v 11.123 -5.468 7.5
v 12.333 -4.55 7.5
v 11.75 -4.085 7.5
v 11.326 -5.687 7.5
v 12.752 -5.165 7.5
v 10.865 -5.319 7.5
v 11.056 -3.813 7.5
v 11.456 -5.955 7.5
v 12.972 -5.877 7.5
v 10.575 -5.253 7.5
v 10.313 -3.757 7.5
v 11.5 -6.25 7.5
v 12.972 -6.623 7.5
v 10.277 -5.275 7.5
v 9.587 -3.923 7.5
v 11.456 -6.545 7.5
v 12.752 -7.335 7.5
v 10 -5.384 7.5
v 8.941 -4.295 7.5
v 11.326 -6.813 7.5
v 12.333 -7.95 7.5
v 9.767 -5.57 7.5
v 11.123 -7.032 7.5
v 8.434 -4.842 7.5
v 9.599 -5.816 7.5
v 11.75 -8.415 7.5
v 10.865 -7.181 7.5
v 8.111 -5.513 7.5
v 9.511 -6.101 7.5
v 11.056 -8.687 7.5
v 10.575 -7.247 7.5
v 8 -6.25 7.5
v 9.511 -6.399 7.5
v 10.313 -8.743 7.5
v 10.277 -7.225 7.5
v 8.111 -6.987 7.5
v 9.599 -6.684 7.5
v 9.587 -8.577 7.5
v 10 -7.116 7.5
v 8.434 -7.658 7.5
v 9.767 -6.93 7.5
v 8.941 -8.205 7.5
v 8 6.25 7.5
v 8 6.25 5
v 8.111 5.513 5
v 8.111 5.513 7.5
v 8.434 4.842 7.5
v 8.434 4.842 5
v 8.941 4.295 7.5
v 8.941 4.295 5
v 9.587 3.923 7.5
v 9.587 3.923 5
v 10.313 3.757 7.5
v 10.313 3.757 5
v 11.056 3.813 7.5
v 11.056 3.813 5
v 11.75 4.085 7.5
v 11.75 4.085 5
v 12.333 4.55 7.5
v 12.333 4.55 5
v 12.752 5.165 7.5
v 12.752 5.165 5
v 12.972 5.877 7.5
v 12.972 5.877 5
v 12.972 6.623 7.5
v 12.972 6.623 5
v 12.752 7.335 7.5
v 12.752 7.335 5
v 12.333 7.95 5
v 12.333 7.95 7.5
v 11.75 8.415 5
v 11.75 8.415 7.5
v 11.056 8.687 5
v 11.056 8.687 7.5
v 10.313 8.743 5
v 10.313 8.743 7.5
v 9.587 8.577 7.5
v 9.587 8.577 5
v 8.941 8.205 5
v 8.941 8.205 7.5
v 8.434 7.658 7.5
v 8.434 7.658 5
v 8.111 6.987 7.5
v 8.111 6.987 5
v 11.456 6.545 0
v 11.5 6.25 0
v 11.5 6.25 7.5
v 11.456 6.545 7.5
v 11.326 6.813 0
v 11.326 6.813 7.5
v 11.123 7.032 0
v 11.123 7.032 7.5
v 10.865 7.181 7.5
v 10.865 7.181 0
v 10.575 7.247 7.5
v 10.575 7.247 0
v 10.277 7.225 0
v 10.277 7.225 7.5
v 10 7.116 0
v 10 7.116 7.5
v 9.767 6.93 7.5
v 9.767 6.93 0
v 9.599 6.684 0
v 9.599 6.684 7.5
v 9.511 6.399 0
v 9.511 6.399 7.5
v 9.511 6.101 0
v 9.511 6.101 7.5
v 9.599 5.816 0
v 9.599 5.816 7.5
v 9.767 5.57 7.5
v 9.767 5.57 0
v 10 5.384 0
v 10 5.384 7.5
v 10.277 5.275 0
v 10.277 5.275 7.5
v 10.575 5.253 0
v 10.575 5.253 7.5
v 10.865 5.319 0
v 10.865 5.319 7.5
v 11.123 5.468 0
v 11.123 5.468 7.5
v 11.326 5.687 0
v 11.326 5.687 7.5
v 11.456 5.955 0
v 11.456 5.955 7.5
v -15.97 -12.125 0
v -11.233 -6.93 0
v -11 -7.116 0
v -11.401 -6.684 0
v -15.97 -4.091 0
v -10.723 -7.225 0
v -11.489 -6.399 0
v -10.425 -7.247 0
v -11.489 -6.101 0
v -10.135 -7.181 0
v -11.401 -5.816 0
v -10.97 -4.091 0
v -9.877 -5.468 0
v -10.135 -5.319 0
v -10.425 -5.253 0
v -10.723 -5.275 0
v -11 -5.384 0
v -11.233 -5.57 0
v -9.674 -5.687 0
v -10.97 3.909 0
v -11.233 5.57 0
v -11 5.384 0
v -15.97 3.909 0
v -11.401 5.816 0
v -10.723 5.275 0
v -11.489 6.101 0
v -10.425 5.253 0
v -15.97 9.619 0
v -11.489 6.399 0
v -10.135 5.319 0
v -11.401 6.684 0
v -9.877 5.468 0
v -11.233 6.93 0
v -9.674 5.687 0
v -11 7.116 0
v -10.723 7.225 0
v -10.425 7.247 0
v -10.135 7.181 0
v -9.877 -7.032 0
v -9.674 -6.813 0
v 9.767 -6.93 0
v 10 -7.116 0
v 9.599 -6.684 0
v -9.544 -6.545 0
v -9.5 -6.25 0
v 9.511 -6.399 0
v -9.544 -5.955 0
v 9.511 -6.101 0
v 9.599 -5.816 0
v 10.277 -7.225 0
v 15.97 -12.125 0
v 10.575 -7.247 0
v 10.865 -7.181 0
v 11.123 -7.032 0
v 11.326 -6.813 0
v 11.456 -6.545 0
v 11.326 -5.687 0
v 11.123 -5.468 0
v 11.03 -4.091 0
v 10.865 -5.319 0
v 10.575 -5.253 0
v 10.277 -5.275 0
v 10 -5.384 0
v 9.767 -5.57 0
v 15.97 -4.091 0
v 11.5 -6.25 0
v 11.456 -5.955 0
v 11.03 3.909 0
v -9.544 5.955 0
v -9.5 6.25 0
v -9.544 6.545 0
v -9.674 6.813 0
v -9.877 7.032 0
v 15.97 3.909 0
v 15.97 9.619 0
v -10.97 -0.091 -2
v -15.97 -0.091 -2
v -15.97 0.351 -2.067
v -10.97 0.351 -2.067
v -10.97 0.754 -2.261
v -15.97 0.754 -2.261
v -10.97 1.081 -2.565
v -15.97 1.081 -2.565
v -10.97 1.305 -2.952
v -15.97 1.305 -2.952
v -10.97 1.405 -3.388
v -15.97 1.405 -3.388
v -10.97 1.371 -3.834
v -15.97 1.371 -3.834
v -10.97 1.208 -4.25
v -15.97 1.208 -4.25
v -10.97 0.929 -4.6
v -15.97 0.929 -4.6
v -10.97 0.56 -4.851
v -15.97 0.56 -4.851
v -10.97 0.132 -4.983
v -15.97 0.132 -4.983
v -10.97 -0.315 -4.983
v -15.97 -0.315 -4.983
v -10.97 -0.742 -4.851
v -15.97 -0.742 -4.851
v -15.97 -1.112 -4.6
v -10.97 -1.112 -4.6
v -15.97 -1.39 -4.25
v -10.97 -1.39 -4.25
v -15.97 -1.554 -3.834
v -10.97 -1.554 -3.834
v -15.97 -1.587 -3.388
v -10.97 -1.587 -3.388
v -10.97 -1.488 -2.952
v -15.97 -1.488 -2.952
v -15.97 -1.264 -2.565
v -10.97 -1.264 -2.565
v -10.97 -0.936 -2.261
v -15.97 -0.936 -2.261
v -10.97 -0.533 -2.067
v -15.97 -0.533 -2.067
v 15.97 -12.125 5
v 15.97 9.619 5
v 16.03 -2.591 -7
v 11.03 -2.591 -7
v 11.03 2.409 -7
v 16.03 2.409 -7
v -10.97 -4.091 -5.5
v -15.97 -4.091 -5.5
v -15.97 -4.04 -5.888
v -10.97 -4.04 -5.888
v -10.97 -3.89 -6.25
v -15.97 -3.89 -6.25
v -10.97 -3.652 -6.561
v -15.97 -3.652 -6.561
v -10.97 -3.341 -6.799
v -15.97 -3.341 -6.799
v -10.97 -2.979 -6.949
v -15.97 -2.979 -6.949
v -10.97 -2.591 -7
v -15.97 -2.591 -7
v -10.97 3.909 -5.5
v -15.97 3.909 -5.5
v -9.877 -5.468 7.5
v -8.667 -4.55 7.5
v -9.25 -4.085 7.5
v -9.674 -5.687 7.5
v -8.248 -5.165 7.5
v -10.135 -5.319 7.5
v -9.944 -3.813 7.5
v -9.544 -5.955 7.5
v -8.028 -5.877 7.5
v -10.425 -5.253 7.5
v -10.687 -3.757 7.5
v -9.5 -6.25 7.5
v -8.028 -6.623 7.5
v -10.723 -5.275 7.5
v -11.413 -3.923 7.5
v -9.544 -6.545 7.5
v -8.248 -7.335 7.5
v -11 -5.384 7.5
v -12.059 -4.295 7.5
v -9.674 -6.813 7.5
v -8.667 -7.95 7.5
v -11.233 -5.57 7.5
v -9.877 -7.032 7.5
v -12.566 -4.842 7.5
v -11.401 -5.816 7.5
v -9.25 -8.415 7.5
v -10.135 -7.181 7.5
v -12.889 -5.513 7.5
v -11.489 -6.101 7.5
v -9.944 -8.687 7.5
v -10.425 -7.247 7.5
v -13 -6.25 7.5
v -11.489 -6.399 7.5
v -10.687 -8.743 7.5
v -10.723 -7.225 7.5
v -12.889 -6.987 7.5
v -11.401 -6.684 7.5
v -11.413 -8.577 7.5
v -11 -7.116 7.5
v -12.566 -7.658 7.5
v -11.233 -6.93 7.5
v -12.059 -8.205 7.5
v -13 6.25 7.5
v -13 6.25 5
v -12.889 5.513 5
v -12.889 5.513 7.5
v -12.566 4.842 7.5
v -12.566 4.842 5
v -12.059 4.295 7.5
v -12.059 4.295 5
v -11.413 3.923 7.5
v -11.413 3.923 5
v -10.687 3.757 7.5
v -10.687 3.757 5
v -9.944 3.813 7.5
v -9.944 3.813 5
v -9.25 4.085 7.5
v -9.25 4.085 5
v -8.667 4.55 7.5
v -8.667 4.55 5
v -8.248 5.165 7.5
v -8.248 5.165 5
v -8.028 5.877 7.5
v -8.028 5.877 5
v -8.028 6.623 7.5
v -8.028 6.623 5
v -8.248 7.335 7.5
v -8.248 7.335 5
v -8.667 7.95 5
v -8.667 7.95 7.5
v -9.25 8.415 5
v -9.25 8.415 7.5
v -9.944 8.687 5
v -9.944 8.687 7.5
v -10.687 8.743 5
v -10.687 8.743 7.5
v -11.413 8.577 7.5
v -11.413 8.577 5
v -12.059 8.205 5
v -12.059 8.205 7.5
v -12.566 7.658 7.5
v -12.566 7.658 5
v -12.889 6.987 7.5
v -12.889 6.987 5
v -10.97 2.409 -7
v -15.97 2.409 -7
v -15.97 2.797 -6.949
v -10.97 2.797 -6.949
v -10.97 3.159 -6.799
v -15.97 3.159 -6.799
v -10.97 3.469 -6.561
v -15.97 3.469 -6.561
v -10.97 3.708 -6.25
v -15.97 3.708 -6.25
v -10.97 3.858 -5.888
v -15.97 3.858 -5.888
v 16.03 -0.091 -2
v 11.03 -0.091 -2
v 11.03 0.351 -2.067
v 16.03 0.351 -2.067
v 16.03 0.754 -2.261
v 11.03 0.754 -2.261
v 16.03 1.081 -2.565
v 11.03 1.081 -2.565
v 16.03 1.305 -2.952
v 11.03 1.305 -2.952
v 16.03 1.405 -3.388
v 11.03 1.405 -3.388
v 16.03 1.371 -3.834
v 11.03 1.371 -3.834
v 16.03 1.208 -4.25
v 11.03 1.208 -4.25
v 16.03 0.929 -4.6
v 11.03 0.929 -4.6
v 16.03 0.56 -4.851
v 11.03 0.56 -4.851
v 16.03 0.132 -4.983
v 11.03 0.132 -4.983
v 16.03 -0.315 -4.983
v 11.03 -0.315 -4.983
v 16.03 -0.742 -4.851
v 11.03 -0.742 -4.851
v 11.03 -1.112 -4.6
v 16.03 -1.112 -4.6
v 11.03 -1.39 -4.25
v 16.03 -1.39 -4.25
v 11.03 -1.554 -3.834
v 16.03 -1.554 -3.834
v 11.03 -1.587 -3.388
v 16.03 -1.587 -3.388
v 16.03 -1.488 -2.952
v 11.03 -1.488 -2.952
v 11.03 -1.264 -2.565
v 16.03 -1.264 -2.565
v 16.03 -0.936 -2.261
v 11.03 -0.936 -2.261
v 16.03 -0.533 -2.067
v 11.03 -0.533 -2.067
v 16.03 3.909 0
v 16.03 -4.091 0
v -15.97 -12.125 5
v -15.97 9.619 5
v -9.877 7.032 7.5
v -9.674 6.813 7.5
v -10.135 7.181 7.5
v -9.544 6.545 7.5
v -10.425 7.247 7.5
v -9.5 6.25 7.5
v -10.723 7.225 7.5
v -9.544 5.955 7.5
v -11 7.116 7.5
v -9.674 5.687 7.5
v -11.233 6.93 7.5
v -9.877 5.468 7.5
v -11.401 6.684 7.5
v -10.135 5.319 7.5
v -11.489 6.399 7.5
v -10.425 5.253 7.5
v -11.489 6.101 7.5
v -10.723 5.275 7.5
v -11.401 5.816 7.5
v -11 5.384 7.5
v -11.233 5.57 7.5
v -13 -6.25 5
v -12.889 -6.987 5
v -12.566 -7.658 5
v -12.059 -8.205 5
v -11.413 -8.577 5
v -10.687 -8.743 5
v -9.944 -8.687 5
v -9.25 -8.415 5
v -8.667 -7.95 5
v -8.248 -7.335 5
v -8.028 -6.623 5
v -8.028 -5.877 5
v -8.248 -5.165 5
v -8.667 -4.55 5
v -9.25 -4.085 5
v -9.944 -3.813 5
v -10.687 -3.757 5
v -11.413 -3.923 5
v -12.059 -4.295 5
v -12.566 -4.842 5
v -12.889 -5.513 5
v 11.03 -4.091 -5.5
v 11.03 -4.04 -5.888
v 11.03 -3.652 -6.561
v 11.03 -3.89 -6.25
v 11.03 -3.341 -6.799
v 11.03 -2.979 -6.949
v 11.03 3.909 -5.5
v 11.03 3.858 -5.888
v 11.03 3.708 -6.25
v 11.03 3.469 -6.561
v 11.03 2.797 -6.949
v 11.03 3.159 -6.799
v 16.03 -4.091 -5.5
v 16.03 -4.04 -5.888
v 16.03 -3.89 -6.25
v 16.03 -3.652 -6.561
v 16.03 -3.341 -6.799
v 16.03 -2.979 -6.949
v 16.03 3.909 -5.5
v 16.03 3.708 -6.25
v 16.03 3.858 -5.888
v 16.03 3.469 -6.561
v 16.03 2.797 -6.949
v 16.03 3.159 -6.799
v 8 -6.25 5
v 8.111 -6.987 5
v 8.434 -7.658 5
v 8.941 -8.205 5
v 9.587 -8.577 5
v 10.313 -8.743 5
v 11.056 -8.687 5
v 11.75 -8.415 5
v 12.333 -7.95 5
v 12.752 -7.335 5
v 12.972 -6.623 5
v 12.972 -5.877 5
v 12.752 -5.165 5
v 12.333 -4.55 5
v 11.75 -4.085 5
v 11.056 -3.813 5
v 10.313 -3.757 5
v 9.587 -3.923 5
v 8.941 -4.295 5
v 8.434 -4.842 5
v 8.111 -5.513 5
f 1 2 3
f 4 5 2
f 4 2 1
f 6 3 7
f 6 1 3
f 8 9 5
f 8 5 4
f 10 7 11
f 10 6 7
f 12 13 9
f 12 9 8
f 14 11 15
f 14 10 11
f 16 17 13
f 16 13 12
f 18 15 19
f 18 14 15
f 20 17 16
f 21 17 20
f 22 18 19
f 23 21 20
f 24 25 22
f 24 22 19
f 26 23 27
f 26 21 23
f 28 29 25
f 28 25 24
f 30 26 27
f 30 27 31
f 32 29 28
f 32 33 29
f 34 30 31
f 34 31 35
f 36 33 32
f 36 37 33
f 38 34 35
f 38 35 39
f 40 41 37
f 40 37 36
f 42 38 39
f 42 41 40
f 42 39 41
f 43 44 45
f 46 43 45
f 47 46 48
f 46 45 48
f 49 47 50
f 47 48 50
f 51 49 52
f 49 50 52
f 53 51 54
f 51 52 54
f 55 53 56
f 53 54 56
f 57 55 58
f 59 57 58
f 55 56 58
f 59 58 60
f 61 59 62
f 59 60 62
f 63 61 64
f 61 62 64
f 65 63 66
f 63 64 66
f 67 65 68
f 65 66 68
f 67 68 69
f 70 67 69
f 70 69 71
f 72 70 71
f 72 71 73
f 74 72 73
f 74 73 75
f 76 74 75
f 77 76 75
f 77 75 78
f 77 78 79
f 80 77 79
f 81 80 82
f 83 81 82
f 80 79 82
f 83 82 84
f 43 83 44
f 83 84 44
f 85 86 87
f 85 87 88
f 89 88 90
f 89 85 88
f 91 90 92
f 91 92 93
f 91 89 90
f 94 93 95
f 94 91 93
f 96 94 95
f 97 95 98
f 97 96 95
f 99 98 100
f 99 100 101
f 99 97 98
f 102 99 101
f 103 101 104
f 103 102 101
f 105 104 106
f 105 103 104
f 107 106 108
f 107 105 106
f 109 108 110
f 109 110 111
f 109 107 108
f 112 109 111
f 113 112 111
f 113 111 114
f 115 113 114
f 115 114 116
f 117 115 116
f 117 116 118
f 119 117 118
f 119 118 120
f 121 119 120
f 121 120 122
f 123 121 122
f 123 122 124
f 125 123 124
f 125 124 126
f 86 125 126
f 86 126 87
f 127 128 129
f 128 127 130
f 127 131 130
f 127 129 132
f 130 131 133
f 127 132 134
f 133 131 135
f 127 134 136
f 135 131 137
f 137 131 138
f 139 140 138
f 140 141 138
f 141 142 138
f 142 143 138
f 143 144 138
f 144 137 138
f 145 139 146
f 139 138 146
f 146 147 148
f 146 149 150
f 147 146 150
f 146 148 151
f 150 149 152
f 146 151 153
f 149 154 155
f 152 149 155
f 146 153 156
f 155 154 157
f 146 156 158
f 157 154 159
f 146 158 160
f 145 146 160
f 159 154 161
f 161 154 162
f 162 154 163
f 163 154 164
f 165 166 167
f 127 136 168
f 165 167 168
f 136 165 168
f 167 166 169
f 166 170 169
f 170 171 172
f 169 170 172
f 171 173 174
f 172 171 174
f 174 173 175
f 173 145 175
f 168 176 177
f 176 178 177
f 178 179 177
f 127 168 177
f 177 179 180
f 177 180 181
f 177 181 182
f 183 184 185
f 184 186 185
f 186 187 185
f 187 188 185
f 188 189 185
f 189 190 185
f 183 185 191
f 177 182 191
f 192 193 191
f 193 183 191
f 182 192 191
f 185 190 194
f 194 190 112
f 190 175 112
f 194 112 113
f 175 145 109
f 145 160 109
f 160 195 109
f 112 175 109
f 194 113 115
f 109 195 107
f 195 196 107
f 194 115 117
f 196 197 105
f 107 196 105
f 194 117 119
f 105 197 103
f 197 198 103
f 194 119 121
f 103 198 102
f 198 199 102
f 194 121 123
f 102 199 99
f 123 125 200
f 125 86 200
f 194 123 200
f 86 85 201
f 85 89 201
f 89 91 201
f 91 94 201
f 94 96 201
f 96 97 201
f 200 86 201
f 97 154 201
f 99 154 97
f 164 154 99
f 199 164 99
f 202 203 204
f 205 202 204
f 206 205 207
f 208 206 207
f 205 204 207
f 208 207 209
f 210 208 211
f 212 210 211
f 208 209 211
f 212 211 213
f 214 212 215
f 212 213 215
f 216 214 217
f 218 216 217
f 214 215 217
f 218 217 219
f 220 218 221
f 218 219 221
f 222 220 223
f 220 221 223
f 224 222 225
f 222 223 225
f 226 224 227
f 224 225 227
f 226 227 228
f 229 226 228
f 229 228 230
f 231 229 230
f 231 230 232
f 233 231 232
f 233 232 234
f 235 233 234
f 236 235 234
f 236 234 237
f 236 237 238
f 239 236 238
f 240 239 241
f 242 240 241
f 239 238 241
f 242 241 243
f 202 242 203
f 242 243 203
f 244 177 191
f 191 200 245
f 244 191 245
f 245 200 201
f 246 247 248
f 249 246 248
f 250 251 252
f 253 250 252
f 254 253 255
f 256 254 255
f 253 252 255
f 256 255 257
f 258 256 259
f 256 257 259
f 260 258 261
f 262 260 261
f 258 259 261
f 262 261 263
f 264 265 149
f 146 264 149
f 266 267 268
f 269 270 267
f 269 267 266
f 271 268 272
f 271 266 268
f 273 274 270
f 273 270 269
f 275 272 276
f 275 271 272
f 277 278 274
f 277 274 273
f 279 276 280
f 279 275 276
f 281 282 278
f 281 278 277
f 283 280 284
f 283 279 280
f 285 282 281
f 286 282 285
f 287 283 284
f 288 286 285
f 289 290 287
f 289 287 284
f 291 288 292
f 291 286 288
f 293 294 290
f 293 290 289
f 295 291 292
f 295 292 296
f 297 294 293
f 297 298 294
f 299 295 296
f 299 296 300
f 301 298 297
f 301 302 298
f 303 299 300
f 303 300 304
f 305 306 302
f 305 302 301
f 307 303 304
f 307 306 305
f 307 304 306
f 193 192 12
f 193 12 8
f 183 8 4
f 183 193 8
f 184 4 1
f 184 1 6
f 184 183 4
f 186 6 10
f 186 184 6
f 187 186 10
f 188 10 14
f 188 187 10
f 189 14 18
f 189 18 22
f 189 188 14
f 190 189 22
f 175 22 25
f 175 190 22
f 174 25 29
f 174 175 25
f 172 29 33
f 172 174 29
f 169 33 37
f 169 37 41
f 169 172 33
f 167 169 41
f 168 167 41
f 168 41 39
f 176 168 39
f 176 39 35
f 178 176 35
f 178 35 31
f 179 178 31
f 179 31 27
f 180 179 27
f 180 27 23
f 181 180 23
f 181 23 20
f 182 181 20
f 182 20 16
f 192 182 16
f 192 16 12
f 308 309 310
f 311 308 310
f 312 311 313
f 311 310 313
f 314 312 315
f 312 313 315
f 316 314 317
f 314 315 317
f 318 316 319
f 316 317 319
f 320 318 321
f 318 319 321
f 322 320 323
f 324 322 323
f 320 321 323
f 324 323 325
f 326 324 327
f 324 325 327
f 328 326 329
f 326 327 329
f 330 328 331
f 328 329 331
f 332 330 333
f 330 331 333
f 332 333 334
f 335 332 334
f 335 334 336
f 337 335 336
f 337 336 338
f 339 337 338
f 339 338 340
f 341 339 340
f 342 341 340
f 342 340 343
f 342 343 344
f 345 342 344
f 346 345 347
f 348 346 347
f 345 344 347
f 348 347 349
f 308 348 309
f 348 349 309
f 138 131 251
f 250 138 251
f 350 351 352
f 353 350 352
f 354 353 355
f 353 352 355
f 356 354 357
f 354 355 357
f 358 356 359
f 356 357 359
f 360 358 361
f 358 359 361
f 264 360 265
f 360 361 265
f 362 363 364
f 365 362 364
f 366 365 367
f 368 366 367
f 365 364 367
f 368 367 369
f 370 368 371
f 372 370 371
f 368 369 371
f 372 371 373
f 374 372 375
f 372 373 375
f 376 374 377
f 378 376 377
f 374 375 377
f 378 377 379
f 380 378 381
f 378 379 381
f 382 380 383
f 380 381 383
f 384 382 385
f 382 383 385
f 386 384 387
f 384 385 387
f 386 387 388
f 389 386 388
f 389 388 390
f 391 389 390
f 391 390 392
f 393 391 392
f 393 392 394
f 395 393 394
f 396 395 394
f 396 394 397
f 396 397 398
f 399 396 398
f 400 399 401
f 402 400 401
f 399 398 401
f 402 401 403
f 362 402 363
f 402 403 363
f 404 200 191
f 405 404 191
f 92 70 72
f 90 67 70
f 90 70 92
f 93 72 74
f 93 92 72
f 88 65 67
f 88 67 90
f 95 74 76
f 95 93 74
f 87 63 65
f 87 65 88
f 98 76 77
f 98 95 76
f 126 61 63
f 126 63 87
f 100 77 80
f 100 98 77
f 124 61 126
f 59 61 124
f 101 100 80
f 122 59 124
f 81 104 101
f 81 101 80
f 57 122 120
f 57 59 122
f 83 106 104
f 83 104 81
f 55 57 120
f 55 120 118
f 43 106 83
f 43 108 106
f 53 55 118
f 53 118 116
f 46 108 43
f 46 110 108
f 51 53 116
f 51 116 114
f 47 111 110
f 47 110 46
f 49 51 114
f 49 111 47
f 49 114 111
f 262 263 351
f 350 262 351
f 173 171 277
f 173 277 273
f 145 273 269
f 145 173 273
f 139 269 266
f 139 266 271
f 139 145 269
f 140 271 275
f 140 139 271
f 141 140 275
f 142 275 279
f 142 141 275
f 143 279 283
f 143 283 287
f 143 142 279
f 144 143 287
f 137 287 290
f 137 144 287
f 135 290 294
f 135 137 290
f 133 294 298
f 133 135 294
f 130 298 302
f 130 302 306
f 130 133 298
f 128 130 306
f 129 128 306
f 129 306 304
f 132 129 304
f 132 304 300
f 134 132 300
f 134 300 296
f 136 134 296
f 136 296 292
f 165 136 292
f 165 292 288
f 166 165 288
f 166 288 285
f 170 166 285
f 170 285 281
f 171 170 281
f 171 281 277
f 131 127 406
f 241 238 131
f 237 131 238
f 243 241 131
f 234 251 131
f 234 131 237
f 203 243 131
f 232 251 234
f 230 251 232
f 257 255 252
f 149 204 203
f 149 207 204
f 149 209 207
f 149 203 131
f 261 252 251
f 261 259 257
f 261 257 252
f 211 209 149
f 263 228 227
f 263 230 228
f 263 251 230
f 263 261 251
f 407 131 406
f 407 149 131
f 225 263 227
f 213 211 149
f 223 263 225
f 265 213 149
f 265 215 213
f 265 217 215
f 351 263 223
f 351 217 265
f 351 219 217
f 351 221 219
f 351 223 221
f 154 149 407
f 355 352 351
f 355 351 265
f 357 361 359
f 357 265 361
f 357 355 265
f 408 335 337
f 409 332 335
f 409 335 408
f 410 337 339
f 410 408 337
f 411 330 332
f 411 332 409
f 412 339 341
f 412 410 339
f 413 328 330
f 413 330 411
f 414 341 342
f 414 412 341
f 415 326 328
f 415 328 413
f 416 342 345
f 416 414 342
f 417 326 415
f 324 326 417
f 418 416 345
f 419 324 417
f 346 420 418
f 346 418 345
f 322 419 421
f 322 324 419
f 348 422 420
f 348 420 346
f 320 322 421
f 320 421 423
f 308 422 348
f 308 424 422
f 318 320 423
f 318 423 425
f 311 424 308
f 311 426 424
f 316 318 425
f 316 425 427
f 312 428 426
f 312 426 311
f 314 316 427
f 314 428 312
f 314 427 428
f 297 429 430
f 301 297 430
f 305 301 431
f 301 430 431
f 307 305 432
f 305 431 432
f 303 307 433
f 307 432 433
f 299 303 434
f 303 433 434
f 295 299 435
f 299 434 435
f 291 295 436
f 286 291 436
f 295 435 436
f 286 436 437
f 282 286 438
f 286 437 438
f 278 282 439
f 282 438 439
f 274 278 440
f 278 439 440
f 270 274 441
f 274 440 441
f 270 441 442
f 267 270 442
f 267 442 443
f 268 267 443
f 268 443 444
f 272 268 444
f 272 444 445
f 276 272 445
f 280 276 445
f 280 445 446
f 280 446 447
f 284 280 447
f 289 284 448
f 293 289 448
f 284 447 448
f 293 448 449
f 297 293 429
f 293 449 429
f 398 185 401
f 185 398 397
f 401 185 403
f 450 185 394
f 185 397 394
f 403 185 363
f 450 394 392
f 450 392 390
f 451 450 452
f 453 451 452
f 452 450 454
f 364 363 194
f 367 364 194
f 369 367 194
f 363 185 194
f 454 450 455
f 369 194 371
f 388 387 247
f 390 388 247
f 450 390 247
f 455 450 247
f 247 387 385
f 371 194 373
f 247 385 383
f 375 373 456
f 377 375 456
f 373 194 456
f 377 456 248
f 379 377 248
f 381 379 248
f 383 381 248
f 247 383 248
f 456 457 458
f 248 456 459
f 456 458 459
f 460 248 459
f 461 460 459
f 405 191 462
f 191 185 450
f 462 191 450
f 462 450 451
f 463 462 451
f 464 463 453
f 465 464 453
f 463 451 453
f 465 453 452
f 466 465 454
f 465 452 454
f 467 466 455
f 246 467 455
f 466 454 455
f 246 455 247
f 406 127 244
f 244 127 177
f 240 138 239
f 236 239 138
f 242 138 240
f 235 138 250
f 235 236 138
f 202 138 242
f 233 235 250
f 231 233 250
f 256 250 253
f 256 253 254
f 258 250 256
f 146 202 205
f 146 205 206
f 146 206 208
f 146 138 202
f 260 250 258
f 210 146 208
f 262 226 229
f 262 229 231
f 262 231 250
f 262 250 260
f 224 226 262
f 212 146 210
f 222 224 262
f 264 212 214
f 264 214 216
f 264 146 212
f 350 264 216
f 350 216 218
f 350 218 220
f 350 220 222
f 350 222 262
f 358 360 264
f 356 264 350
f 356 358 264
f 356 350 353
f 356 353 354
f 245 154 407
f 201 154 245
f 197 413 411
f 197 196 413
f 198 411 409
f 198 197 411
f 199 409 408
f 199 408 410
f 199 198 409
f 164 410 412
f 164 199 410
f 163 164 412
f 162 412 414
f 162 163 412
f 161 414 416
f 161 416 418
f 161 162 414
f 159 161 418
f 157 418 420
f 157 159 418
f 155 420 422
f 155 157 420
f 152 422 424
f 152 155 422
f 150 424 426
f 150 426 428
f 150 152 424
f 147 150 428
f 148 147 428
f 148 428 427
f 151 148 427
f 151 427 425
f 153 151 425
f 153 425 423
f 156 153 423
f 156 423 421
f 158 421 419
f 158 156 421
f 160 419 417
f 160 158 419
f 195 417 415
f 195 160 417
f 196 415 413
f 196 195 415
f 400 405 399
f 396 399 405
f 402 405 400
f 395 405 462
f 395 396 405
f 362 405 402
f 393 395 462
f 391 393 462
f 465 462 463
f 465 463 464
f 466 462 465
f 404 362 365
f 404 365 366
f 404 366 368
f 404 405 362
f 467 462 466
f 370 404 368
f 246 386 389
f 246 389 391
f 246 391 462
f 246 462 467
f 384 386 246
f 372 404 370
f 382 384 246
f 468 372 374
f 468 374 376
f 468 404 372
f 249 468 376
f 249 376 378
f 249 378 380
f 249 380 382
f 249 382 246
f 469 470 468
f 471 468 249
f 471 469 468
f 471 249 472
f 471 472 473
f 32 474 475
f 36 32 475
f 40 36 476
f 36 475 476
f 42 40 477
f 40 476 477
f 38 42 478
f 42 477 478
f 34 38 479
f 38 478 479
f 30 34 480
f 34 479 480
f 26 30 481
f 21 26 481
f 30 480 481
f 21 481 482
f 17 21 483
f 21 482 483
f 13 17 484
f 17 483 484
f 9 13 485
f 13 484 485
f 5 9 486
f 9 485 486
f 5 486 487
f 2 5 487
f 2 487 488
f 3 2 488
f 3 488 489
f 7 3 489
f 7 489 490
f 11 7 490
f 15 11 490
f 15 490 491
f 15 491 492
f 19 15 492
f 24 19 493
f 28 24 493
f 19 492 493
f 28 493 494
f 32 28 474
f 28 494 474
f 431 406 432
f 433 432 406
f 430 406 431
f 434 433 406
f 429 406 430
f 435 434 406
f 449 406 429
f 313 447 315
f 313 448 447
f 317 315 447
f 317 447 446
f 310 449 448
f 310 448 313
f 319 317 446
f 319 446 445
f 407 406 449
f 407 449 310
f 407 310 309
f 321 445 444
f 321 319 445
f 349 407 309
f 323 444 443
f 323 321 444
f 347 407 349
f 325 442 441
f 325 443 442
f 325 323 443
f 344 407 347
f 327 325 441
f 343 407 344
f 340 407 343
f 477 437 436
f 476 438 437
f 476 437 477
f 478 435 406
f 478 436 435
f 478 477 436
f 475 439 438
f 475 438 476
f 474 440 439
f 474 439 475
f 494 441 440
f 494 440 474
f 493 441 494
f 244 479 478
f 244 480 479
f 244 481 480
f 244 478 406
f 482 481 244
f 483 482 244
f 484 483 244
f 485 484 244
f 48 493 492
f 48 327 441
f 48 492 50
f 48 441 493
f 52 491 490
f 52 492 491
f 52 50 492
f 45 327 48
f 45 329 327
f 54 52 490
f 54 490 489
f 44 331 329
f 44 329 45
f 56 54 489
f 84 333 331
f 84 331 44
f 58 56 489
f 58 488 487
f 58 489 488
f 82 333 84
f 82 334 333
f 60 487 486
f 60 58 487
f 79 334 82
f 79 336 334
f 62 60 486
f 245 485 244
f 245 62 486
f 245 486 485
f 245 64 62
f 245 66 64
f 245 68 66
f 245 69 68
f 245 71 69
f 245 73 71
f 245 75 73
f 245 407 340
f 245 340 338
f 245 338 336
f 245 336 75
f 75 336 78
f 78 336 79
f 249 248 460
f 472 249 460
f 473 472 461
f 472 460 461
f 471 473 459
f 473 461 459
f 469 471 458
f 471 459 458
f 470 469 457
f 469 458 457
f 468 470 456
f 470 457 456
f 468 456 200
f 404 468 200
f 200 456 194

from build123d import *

# Parameters (mm, degrees)
ESQUISSE1_W                = 31.939489742
ESQUISSE1_H                = 21.744204364
ESQUISSE1_R                = 1
BOSS_EXTRU_1_DEPTH         = 5
ESQUISSE2_R                = 2.5
ESQUISSE2_R_2              = 1
BOSS_EXTRU_2_DEPTH         = 2.5
ESQUISSE4_R                = 1.5
BOSS_EXTRU_3_DEPTH         = 5
R_P_TITION_LIN_AIRE1_COUNT = 2
R_P_TITION_LIN_AIRE1_PITCH = 27


with BuildPart() as part:
    # Esquisse1 → Boss.-Extru.1 (new body)
    with BuildSketch(Plane.XY):
        with Locations((0, -1.253300442)):
            Rectangle(ESQUISSE1_W, ESQUISSE1_H)
        with Locations((10.5, 6.25)):
            Circle(ESQUISSE1_R, mode=Mode.SUBTRACT)
        with Locations((10.5, -6.25)):
            Circle(ESQUISSE1_R, mode=Mode.SUBTRACT)
        with Locations((-10.5, -6.25)):
            Circle(ESQUISSE1_R, mode=Mode.SUBTRACT)
        with Locations((-10.5, 6.25)):
            Circle(ESQUISSE1_R, mode=Mode.SUBTRACT)
    extrude(amount=BOSS_EXTRU_1_DEPTH)

    # Esquisse2 → Boss.-Extru.2 (add)
    # profile 1 of 4: a face of its own
    with BuildSketch(Plane.XY.offset(5)):
        with Locations(Location((-10.5, 6.25, 0), (0, 0, 180))):
            Circle(ESQUISSE2_R)
        with Locations((-10.5, 6.25)):
            Circle(ESQUISSE2_R_2, mode=Mode.SUBTRACT)
    # profile 2 of 4: a face of its own
    with BuildSketch(Plane.XY.offset(5)):
        with Locations(Location((10.5, 6.25, 0), (0, 0, 180))):
            Circle(ESQUISSE2_R)
        with Locations((10.5, 6.25)):
            Circle(ESQUISSE2_R_2, mode=Mode.SUBTRACT)
    # profile 3 of 4: a face of its own
    with BuildSketch(Plane.XY.offset(5)):
        with Locations(Location((10.5, -6.25, 0), (0, 0, 180))):
            Circle(ESQUISSE2_R)
        with Locations((10.5, -6.25)):
            Circle(ESQUISSE2_R_2, mode=Mode.SUBTRACT)
    # profile 4 of 4: a face of its own
    with BuildSketch(Plane.XY.offset(5)):
        with Locations(Location((-10.5, -6.25, 0), (0, 0, 180))):
            Circle(ESQUISSE2_R)
        with Locations((-10.5, -6.25)):
            Circle(ESQUISSE2_R_2, mode=Mode.SUBTRACT)
    extrude(amount=BOSS_EXTRU_2_DEPTH)

    # Esquisse4 → Boss.-Extru.3 (add)
    with BuildSketch(Plane.ZY.offset(15.969744871)):
        with BuildLine():
            Line((0, -4.091257207), (-5.5, -4.091257207))
            ThreePointArc((-5.5, -4.091257207), (-6.560660172, -3.651917379), (-7, -2.591257207))
            Line((-7, -2.591257207), (-7, 2.408742793))
            ThreePointArc((-7, 2.408742793), (-6.560660172, 3.469402965), (-5.5, 3.908742793))
            Line((-5.5, 3.908742793), (0, 3.908742793))
            Line((0, 3.908742793), (0, -4.091257207))
        make_face()
        with Locations((-3.5, -0.091257207)):
            Circle(ESQUISSE4_R, mode=Mode.SUBTRACT)
    boss_extru_3 = extrude(amount=-BOSS_EXTRU_3_DEPTH)

    # Répétition linéaire1: Boss.-Extru.3 ×2
    with Locations(*[(i * R_P_TITION_LIN_AIRE1_PITCH, 0, 0) for i in range(1, R_P_TITION_LIN_AIRE1_COUNT)]):
        add(boss_extru_3)


solid = part.part
